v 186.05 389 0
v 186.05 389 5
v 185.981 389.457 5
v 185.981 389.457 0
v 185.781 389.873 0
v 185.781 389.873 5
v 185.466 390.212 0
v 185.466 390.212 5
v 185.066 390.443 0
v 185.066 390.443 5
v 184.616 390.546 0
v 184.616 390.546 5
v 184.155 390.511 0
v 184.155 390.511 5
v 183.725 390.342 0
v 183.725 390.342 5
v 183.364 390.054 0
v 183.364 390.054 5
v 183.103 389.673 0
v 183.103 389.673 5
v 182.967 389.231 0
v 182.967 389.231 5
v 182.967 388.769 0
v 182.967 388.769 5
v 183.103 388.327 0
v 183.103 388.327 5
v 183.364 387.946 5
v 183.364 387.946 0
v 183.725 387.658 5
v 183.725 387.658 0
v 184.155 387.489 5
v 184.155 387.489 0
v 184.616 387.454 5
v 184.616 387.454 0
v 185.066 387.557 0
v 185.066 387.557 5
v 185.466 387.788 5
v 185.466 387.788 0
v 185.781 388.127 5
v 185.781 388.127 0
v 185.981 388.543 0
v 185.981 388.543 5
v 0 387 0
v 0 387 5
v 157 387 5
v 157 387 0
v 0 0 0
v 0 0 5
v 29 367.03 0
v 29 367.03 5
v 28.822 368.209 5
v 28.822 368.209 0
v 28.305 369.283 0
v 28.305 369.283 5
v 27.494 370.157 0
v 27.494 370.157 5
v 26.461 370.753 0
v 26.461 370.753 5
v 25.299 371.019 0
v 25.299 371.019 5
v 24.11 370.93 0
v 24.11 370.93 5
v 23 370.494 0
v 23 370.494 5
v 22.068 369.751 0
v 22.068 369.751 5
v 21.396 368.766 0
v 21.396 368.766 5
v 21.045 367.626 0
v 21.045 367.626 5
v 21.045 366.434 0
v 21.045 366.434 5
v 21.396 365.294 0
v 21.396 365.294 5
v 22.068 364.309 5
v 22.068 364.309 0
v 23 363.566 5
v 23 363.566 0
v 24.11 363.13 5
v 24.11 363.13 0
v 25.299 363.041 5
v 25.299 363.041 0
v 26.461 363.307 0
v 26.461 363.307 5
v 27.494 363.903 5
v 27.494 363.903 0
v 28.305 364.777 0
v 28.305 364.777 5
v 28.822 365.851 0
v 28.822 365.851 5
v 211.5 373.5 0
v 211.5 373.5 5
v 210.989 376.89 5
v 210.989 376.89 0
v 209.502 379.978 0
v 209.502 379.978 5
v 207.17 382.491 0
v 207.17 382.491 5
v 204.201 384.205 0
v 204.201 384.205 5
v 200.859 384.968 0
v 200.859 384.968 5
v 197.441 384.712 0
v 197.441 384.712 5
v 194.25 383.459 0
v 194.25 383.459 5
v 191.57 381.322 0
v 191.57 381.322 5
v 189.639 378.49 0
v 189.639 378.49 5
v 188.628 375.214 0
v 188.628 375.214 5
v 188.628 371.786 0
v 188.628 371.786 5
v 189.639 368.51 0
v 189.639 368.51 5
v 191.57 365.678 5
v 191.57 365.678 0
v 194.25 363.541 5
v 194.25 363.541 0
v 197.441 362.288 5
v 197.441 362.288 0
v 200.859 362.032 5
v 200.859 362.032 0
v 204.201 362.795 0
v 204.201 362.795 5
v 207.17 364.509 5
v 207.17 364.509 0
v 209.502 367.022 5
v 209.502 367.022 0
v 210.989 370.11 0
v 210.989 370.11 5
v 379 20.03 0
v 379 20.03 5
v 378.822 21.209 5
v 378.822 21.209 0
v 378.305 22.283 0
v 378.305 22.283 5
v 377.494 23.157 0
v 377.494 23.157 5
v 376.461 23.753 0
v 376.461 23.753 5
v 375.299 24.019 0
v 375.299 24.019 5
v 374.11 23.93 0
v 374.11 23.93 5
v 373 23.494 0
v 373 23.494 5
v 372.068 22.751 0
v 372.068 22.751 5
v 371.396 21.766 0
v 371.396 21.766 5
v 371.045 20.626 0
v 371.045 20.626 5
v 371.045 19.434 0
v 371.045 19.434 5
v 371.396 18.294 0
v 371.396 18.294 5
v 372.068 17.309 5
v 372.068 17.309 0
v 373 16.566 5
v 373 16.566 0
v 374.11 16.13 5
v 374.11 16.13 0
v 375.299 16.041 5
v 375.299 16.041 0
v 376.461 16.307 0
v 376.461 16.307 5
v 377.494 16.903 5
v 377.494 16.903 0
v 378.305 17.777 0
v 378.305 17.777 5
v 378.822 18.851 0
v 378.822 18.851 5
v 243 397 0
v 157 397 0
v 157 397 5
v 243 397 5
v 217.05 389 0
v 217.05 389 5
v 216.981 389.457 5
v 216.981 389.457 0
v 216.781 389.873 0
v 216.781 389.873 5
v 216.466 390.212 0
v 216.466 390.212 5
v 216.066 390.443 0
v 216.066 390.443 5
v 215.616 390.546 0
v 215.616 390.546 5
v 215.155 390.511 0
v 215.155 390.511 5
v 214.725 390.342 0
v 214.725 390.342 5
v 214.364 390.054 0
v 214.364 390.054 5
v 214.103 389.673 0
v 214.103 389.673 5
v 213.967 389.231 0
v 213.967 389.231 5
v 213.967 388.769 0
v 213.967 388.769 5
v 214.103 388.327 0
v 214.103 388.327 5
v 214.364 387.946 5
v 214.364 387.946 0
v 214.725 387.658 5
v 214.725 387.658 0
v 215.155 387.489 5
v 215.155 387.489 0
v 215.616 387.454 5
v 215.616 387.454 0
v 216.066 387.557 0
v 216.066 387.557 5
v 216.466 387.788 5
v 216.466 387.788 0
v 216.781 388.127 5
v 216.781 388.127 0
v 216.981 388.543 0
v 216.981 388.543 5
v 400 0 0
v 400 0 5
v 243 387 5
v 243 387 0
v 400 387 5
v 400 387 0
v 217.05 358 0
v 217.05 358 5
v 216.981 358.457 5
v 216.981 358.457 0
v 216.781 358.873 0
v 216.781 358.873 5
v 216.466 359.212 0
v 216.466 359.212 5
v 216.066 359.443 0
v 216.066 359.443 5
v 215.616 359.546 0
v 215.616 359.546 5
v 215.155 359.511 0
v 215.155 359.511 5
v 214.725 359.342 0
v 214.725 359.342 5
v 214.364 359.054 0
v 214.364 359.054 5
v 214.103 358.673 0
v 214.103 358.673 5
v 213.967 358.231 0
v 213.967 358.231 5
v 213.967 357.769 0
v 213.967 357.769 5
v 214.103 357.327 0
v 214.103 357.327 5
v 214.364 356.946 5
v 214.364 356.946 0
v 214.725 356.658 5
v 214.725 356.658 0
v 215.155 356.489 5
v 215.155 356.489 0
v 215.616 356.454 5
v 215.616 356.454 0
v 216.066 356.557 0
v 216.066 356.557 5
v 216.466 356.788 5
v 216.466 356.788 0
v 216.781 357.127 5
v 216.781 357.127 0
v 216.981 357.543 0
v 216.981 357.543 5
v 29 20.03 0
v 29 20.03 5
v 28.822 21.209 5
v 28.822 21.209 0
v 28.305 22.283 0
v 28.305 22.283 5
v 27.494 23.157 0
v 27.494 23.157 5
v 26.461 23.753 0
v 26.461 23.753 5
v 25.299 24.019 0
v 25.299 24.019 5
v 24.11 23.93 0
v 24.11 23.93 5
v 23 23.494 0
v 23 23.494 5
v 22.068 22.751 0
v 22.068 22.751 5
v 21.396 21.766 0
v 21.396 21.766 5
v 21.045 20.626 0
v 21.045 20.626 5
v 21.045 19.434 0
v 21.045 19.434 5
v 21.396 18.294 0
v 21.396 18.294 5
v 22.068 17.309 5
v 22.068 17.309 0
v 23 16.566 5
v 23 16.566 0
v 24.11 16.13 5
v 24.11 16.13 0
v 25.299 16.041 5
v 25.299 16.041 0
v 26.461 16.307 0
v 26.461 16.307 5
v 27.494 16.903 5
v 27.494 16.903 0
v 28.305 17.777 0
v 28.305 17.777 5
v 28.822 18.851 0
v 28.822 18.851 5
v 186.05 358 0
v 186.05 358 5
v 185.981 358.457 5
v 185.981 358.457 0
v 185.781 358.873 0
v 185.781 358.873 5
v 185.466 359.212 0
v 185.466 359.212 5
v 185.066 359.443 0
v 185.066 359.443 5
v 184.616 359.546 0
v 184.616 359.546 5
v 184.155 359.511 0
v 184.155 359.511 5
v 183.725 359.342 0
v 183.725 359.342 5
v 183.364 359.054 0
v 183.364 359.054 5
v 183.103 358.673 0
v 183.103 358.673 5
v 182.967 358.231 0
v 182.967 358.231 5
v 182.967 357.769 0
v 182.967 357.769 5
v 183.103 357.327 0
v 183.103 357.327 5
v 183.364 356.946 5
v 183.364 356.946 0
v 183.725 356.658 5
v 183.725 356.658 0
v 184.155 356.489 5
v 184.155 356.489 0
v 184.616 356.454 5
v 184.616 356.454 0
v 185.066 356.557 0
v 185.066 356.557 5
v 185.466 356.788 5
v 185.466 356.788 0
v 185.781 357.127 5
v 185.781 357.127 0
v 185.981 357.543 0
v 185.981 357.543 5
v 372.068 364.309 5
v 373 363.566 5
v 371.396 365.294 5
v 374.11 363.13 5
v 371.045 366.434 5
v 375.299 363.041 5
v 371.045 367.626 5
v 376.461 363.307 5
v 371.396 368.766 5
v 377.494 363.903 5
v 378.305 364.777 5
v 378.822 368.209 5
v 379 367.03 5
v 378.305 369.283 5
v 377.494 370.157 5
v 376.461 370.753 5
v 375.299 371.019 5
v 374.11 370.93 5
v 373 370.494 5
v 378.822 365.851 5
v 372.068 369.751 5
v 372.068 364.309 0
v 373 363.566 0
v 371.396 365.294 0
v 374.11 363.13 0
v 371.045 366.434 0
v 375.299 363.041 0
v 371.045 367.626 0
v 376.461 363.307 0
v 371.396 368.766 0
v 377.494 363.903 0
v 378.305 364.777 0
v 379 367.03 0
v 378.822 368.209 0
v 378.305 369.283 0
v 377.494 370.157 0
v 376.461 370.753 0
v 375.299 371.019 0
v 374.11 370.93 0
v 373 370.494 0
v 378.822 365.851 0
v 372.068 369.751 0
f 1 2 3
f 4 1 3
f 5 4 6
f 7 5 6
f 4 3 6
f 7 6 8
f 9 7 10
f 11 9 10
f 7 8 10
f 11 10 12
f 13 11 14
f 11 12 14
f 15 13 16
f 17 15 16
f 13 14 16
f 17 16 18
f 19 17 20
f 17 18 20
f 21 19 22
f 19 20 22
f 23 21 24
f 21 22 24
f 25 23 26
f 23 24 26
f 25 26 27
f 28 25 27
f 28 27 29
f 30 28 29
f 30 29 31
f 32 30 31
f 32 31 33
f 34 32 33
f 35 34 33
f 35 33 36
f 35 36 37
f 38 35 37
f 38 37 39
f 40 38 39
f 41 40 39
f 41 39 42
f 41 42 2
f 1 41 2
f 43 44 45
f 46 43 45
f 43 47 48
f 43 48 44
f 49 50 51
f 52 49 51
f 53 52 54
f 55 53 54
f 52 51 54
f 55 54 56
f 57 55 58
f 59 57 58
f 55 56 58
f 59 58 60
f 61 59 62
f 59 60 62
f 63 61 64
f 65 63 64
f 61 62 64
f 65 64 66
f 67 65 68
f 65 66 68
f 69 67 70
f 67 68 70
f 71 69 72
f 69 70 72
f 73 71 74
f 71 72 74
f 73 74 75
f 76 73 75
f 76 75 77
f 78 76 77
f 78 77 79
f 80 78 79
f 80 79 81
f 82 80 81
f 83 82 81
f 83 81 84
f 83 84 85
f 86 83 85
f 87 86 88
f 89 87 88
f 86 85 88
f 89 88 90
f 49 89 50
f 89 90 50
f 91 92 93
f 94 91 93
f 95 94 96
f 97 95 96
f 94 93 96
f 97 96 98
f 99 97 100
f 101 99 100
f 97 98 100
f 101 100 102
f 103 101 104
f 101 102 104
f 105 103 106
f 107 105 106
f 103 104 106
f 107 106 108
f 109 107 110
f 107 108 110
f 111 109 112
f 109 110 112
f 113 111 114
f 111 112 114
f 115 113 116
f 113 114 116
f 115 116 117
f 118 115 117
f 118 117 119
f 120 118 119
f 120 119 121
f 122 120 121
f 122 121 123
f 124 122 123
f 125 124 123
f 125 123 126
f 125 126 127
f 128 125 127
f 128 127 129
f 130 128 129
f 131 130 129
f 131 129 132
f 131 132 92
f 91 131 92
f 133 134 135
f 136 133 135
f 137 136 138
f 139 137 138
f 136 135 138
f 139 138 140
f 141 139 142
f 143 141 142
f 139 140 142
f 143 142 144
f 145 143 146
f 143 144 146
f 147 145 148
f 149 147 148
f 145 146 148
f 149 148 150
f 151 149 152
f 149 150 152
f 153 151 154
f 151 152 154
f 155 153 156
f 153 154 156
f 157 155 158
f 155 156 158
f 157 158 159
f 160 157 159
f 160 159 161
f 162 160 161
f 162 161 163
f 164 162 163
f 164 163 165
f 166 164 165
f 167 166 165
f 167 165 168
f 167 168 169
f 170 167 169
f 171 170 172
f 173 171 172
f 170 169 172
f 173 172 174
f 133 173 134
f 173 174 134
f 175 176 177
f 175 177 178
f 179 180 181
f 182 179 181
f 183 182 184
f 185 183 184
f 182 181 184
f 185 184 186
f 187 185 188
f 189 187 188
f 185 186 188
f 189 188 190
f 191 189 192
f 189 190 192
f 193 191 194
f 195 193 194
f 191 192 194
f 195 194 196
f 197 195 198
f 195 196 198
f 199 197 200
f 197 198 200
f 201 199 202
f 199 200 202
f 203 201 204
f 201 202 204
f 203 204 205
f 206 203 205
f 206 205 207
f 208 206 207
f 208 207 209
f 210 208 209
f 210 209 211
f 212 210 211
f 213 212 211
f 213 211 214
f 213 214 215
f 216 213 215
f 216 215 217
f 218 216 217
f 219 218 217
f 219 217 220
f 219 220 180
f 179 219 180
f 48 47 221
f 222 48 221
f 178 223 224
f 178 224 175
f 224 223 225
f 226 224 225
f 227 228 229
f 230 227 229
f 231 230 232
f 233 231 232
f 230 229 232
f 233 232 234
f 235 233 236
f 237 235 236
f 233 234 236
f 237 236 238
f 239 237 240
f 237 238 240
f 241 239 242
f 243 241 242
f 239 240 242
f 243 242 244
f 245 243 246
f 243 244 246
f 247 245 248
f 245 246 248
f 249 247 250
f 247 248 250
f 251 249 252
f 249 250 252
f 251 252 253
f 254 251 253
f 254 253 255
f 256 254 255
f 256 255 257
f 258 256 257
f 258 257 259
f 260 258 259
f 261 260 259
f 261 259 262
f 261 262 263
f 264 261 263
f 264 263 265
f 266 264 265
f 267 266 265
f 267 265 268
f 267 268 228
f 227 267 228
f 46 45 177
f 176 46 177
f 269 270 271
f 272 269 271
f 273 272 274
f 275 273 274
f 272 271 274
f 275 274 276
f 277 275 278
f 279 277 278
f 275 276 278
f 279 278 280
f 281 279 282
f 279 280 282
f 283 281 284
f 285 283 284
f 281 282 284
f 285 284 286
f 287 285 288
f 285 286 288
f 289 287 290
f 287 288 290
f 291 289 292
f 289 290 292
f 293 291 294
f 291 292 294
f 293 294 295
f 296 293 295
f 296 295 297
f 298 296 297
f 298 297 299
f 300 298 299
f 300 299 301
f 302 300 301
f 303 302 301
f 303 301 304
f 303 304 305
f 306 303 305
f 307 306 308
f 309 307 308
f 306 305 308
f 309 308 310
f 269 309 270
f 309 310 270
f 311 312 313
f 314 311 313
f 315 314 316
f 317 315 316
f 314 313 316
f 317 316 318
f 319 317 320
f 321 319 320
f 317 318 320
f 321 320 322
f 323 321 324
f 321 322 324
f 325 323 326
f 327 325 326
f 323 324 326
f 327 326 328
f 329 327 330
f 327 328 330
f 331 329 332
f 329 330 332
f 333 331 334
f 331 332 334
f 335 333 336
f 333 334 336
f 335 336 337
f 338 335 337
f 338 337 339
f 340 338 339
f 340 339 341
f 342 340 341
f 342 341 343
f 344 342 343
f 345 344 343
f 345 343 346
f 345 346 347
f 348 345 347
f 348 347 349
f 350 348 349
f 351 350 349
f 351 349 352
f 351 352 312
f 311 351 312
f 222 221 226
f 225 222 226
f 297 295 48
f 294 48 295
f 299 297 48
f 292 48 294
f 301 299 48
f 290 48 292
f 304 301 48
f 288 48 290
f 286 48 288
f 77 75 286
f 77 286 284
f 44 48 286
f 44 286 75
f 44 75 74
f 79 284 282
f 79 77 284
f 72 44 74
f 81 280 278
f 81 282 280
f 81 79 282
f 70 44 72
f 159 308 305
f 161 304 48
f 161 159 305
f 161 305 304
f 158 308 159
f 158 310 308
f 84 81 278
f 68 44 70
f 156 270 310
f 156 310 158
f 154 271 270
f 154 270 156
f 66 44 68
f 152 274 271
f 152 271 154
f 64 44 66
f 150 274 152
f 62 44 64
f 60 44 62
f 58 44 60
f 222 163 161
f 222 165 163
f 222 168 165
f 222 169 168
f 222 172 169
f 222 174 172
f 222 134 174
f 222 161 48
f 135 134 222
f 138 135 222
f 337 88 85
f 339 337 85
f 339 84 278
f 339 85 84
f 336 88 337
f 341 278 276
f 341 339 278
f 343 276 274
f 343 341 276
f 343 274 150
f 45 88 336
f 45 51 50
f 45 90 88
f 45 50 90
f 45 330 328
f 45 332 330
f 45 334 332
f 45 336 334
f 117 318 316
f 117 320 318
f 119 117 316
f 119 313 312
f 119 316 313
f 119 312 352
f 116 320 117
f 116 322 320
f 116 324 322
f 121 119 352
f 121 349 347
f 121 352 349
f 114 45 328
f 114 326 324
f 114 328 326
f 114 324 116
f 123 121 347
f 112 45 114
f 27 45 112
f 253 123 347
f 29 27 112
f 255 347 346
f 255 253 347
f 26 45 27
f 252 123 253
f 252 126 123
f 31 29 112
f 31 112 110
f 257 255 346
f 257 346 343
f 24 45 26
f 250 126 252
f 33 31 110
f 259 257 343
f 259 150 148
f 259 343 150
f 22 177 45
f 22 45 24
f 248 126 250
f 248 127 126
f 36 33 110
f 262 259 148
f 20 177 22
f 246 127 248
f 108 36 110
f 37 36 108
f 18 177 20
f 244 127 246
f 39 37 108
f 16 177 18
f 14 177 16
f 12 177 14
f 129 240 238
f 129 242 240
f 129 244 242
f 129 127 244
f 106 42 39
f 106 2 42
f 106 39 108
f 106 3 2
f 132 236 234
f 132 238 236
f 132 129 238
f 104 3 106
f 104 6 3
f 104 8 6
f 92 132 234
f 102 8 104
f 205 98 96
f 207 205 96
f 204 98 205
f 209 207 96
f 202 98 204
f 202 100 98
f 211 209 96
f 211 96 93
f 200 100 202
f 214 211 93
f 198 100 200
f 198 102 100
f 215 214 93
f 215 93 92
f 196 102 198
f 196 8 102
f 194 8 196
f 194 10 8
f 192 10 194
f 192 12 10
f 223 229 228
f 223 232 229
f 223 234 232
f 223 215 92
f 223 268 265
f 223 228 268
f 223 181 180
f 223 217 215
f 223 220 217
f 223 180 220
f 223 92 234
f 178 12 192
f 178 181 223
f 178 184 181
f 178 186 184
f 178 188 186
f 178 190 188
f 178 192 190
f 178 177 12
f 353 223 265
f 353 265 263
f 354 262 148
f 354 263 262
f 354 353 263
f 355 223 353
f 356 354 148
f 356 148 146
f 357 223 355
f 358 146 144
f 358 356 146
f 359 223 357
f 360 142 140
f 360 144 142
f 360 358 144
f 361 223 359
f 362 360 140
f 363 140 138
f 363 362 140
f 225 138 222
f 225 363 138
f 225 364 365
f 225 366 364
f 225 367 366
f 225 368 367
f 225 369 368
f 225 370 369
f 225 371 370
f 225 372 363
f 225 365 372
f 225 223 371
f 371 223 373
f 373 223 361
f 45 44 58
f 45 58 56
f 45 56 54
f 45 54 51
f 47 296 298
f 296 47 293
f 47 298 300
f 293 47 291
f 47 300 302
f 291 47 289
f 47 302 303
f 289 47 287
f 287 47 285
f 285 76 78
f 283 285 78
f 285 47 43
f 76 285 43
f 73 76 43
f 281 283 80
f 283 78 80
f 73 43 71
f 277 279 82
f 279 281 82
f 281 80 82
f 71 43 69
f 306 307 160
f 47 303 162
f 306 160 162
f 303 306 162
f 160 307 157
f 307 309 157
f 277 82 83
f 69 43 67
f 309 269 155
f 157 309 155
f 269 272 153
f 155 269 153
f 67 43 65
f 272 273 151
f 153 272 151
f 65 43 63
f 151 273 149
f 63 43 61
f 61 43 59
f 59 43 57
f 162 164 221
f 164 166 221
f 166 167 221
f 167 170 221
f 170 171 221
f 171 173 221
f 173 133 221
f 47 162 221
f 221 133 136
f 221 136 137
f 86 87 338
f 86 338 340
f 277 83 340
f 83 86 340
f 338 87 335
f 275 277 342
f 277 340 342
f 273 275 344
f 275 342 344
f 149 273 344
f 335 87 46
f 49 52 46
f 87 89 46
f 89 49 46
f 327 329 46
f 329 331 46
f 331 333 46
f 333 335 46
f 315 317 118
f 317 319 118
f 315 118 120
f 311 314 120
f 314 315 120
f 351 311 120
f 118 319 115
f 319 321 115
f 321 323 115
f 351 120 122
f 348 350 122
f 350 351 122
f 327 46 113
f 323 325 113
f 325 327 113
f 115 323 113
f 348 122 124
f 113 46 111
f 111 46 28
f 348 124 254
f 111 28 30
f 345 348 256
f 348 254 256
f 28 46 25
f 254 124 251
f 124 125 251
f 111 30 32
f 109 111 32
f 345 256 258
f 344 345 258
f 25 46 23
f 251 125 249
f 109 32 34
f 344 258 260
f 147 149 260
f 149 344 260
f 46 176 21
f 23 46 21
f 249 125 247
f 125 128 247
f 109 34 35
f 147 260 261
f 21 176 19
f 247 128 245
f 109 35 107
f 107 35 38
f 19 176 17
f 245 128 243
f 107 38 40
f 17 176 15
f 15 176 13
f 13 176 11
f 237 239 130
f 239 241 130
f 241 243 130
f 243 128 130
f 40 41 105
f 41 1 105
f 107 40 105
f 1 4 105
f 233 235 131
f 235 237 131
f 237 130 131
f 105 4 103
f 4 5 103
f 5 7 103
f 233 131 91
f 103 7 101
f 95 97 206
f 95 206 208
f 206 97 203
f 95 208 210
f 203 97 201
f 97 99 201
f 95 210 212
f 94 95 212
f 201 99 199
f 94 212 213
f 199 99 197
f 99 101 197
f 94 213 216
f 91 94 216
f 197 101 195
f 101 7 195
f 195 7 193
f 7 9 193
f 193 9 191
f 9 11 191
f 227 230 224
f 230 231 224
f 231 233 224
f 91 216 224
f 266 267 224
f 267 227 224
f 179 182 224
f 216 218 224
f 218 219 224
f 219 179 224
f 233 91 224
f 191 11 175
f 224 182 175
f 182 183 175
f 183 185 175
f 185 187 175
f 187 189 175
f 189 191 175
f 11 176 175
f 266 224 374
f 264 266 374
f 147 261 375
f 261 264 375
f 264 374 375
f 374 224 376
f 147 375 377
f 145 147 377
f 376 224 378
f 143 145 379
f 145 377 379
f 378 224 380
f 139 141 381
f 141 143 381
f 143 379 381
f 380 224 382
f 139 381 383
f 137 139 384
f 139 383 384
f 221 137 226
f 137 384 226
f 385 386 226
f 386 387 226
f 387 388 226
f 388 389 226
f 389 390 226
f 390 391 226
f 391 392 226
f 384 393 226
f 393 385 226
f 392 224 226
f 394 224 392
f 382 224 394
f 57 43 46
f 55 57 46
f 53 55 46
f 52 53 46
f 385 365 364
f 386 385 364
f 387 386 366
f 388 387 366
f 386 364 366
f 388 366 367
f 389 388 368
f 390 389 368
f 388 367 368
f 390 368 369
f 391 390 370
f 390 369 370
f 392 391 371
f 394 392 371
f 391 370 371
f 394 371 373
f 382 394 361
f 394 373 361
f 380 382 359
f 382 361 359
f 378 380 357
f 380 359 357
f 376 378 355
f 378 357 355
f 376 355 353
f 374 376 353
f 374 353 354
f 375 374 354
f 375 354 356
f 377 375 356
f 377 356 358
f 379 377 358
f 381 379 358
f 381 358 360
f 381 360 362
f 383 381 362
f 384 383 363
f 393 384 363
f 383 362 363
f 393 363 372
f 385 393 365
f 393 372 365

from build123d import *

# Parameters (mm, degrees)
SKETCH1_W           = 400
SKETCH1_H           = 397
BOSS_EXTRUDE1_DEPTH = 5
SKETCH2_R           = 1.55
CUT_EXTRUDE1_DEPTH  = 6
SKETCH3_R           = 11.5
CUT_EXTRUDE2_DEPTH  = 6
SKETCH4_W           = 157
SKETCH4_H           = 10
CUT_EXTRUDE3_DEPTH  = 6
SKETCH5_R           = 4
CUT_EXTRUDE4_DEPTH  = 5


with BuildPart() as part:
    # Sketch1 → Boss-Extrude1 (new body)
    with BuildSketch(Plane.XY):
        with Locations((200, 198.5)):
            Rectangle(SKETCH1_W, SKETCH1_H)
    extrude(amount=BOSS_EXTRUDE1_DEPTH)

    # Sketch2 → Cut-Extrude1 (cut, through all)
    with BuildSketch(Plane.XY.offset(5)):
        with Locations((215.5, 389)):
            Circle(SKETCH2_R)
        with Locations((215.5, 358)):
            Circle(SKETCH2_R)
        with Locations((184.5, 358)):
            Circle(SKETCH2_R)
        with Locations((184.5, 389)):
            Circle(SKETCH2_R)
    extrude(amount=-CUT_EXTRUDE1_DEPTH, mode=Mode.SUBTRACT)

    # Sketch3 → Cut-Extrude2 (cut, through all)
    with BuildSketch(Plane.XY.offset(5)):
        with Locations((200, 373.5)):
            Circle(SKETCH3_R)
    extrude(amount=-CUT_EXTRUDE2_DEPTH, mode=Mode.SUBTRACT)

    # Sketch4 → Cut-Extrude3 (cut, through all)
    with BuildSketch(Plane.XY.offset(5)):
        with Locations((321.5, 392)):
            Rectangle(SKETCH4_W, SKETCH4_H)
        with Locations((78.5, 392)):
            Rectangle(SKETCH4_W, SKETCH4_H)
    extrude(amount=-CUT_EXTRUDE3_DEPTH, mode=Mode.SUBTRACT)

    # Sketch5 → Cut-Extrude4 (cut)
    with BuildSketch(Plane.XY.offset(5)):
        with Locations((25, 367.03)):
            Circle(SKETCH5_R)
        with Locations((25, 20.03)):
            Circle(SKETCH5_R)
        with Locations((375, 20.03)):
            Circle(SKETCH5_R)
        with Locations((375, 367.03)):
            Circle(SKETCH5_R)
    extrude(amount=-CUT_EXTRUDE4_DEPTH, mode=Mode.SUBTRACT)


solid = part.part
